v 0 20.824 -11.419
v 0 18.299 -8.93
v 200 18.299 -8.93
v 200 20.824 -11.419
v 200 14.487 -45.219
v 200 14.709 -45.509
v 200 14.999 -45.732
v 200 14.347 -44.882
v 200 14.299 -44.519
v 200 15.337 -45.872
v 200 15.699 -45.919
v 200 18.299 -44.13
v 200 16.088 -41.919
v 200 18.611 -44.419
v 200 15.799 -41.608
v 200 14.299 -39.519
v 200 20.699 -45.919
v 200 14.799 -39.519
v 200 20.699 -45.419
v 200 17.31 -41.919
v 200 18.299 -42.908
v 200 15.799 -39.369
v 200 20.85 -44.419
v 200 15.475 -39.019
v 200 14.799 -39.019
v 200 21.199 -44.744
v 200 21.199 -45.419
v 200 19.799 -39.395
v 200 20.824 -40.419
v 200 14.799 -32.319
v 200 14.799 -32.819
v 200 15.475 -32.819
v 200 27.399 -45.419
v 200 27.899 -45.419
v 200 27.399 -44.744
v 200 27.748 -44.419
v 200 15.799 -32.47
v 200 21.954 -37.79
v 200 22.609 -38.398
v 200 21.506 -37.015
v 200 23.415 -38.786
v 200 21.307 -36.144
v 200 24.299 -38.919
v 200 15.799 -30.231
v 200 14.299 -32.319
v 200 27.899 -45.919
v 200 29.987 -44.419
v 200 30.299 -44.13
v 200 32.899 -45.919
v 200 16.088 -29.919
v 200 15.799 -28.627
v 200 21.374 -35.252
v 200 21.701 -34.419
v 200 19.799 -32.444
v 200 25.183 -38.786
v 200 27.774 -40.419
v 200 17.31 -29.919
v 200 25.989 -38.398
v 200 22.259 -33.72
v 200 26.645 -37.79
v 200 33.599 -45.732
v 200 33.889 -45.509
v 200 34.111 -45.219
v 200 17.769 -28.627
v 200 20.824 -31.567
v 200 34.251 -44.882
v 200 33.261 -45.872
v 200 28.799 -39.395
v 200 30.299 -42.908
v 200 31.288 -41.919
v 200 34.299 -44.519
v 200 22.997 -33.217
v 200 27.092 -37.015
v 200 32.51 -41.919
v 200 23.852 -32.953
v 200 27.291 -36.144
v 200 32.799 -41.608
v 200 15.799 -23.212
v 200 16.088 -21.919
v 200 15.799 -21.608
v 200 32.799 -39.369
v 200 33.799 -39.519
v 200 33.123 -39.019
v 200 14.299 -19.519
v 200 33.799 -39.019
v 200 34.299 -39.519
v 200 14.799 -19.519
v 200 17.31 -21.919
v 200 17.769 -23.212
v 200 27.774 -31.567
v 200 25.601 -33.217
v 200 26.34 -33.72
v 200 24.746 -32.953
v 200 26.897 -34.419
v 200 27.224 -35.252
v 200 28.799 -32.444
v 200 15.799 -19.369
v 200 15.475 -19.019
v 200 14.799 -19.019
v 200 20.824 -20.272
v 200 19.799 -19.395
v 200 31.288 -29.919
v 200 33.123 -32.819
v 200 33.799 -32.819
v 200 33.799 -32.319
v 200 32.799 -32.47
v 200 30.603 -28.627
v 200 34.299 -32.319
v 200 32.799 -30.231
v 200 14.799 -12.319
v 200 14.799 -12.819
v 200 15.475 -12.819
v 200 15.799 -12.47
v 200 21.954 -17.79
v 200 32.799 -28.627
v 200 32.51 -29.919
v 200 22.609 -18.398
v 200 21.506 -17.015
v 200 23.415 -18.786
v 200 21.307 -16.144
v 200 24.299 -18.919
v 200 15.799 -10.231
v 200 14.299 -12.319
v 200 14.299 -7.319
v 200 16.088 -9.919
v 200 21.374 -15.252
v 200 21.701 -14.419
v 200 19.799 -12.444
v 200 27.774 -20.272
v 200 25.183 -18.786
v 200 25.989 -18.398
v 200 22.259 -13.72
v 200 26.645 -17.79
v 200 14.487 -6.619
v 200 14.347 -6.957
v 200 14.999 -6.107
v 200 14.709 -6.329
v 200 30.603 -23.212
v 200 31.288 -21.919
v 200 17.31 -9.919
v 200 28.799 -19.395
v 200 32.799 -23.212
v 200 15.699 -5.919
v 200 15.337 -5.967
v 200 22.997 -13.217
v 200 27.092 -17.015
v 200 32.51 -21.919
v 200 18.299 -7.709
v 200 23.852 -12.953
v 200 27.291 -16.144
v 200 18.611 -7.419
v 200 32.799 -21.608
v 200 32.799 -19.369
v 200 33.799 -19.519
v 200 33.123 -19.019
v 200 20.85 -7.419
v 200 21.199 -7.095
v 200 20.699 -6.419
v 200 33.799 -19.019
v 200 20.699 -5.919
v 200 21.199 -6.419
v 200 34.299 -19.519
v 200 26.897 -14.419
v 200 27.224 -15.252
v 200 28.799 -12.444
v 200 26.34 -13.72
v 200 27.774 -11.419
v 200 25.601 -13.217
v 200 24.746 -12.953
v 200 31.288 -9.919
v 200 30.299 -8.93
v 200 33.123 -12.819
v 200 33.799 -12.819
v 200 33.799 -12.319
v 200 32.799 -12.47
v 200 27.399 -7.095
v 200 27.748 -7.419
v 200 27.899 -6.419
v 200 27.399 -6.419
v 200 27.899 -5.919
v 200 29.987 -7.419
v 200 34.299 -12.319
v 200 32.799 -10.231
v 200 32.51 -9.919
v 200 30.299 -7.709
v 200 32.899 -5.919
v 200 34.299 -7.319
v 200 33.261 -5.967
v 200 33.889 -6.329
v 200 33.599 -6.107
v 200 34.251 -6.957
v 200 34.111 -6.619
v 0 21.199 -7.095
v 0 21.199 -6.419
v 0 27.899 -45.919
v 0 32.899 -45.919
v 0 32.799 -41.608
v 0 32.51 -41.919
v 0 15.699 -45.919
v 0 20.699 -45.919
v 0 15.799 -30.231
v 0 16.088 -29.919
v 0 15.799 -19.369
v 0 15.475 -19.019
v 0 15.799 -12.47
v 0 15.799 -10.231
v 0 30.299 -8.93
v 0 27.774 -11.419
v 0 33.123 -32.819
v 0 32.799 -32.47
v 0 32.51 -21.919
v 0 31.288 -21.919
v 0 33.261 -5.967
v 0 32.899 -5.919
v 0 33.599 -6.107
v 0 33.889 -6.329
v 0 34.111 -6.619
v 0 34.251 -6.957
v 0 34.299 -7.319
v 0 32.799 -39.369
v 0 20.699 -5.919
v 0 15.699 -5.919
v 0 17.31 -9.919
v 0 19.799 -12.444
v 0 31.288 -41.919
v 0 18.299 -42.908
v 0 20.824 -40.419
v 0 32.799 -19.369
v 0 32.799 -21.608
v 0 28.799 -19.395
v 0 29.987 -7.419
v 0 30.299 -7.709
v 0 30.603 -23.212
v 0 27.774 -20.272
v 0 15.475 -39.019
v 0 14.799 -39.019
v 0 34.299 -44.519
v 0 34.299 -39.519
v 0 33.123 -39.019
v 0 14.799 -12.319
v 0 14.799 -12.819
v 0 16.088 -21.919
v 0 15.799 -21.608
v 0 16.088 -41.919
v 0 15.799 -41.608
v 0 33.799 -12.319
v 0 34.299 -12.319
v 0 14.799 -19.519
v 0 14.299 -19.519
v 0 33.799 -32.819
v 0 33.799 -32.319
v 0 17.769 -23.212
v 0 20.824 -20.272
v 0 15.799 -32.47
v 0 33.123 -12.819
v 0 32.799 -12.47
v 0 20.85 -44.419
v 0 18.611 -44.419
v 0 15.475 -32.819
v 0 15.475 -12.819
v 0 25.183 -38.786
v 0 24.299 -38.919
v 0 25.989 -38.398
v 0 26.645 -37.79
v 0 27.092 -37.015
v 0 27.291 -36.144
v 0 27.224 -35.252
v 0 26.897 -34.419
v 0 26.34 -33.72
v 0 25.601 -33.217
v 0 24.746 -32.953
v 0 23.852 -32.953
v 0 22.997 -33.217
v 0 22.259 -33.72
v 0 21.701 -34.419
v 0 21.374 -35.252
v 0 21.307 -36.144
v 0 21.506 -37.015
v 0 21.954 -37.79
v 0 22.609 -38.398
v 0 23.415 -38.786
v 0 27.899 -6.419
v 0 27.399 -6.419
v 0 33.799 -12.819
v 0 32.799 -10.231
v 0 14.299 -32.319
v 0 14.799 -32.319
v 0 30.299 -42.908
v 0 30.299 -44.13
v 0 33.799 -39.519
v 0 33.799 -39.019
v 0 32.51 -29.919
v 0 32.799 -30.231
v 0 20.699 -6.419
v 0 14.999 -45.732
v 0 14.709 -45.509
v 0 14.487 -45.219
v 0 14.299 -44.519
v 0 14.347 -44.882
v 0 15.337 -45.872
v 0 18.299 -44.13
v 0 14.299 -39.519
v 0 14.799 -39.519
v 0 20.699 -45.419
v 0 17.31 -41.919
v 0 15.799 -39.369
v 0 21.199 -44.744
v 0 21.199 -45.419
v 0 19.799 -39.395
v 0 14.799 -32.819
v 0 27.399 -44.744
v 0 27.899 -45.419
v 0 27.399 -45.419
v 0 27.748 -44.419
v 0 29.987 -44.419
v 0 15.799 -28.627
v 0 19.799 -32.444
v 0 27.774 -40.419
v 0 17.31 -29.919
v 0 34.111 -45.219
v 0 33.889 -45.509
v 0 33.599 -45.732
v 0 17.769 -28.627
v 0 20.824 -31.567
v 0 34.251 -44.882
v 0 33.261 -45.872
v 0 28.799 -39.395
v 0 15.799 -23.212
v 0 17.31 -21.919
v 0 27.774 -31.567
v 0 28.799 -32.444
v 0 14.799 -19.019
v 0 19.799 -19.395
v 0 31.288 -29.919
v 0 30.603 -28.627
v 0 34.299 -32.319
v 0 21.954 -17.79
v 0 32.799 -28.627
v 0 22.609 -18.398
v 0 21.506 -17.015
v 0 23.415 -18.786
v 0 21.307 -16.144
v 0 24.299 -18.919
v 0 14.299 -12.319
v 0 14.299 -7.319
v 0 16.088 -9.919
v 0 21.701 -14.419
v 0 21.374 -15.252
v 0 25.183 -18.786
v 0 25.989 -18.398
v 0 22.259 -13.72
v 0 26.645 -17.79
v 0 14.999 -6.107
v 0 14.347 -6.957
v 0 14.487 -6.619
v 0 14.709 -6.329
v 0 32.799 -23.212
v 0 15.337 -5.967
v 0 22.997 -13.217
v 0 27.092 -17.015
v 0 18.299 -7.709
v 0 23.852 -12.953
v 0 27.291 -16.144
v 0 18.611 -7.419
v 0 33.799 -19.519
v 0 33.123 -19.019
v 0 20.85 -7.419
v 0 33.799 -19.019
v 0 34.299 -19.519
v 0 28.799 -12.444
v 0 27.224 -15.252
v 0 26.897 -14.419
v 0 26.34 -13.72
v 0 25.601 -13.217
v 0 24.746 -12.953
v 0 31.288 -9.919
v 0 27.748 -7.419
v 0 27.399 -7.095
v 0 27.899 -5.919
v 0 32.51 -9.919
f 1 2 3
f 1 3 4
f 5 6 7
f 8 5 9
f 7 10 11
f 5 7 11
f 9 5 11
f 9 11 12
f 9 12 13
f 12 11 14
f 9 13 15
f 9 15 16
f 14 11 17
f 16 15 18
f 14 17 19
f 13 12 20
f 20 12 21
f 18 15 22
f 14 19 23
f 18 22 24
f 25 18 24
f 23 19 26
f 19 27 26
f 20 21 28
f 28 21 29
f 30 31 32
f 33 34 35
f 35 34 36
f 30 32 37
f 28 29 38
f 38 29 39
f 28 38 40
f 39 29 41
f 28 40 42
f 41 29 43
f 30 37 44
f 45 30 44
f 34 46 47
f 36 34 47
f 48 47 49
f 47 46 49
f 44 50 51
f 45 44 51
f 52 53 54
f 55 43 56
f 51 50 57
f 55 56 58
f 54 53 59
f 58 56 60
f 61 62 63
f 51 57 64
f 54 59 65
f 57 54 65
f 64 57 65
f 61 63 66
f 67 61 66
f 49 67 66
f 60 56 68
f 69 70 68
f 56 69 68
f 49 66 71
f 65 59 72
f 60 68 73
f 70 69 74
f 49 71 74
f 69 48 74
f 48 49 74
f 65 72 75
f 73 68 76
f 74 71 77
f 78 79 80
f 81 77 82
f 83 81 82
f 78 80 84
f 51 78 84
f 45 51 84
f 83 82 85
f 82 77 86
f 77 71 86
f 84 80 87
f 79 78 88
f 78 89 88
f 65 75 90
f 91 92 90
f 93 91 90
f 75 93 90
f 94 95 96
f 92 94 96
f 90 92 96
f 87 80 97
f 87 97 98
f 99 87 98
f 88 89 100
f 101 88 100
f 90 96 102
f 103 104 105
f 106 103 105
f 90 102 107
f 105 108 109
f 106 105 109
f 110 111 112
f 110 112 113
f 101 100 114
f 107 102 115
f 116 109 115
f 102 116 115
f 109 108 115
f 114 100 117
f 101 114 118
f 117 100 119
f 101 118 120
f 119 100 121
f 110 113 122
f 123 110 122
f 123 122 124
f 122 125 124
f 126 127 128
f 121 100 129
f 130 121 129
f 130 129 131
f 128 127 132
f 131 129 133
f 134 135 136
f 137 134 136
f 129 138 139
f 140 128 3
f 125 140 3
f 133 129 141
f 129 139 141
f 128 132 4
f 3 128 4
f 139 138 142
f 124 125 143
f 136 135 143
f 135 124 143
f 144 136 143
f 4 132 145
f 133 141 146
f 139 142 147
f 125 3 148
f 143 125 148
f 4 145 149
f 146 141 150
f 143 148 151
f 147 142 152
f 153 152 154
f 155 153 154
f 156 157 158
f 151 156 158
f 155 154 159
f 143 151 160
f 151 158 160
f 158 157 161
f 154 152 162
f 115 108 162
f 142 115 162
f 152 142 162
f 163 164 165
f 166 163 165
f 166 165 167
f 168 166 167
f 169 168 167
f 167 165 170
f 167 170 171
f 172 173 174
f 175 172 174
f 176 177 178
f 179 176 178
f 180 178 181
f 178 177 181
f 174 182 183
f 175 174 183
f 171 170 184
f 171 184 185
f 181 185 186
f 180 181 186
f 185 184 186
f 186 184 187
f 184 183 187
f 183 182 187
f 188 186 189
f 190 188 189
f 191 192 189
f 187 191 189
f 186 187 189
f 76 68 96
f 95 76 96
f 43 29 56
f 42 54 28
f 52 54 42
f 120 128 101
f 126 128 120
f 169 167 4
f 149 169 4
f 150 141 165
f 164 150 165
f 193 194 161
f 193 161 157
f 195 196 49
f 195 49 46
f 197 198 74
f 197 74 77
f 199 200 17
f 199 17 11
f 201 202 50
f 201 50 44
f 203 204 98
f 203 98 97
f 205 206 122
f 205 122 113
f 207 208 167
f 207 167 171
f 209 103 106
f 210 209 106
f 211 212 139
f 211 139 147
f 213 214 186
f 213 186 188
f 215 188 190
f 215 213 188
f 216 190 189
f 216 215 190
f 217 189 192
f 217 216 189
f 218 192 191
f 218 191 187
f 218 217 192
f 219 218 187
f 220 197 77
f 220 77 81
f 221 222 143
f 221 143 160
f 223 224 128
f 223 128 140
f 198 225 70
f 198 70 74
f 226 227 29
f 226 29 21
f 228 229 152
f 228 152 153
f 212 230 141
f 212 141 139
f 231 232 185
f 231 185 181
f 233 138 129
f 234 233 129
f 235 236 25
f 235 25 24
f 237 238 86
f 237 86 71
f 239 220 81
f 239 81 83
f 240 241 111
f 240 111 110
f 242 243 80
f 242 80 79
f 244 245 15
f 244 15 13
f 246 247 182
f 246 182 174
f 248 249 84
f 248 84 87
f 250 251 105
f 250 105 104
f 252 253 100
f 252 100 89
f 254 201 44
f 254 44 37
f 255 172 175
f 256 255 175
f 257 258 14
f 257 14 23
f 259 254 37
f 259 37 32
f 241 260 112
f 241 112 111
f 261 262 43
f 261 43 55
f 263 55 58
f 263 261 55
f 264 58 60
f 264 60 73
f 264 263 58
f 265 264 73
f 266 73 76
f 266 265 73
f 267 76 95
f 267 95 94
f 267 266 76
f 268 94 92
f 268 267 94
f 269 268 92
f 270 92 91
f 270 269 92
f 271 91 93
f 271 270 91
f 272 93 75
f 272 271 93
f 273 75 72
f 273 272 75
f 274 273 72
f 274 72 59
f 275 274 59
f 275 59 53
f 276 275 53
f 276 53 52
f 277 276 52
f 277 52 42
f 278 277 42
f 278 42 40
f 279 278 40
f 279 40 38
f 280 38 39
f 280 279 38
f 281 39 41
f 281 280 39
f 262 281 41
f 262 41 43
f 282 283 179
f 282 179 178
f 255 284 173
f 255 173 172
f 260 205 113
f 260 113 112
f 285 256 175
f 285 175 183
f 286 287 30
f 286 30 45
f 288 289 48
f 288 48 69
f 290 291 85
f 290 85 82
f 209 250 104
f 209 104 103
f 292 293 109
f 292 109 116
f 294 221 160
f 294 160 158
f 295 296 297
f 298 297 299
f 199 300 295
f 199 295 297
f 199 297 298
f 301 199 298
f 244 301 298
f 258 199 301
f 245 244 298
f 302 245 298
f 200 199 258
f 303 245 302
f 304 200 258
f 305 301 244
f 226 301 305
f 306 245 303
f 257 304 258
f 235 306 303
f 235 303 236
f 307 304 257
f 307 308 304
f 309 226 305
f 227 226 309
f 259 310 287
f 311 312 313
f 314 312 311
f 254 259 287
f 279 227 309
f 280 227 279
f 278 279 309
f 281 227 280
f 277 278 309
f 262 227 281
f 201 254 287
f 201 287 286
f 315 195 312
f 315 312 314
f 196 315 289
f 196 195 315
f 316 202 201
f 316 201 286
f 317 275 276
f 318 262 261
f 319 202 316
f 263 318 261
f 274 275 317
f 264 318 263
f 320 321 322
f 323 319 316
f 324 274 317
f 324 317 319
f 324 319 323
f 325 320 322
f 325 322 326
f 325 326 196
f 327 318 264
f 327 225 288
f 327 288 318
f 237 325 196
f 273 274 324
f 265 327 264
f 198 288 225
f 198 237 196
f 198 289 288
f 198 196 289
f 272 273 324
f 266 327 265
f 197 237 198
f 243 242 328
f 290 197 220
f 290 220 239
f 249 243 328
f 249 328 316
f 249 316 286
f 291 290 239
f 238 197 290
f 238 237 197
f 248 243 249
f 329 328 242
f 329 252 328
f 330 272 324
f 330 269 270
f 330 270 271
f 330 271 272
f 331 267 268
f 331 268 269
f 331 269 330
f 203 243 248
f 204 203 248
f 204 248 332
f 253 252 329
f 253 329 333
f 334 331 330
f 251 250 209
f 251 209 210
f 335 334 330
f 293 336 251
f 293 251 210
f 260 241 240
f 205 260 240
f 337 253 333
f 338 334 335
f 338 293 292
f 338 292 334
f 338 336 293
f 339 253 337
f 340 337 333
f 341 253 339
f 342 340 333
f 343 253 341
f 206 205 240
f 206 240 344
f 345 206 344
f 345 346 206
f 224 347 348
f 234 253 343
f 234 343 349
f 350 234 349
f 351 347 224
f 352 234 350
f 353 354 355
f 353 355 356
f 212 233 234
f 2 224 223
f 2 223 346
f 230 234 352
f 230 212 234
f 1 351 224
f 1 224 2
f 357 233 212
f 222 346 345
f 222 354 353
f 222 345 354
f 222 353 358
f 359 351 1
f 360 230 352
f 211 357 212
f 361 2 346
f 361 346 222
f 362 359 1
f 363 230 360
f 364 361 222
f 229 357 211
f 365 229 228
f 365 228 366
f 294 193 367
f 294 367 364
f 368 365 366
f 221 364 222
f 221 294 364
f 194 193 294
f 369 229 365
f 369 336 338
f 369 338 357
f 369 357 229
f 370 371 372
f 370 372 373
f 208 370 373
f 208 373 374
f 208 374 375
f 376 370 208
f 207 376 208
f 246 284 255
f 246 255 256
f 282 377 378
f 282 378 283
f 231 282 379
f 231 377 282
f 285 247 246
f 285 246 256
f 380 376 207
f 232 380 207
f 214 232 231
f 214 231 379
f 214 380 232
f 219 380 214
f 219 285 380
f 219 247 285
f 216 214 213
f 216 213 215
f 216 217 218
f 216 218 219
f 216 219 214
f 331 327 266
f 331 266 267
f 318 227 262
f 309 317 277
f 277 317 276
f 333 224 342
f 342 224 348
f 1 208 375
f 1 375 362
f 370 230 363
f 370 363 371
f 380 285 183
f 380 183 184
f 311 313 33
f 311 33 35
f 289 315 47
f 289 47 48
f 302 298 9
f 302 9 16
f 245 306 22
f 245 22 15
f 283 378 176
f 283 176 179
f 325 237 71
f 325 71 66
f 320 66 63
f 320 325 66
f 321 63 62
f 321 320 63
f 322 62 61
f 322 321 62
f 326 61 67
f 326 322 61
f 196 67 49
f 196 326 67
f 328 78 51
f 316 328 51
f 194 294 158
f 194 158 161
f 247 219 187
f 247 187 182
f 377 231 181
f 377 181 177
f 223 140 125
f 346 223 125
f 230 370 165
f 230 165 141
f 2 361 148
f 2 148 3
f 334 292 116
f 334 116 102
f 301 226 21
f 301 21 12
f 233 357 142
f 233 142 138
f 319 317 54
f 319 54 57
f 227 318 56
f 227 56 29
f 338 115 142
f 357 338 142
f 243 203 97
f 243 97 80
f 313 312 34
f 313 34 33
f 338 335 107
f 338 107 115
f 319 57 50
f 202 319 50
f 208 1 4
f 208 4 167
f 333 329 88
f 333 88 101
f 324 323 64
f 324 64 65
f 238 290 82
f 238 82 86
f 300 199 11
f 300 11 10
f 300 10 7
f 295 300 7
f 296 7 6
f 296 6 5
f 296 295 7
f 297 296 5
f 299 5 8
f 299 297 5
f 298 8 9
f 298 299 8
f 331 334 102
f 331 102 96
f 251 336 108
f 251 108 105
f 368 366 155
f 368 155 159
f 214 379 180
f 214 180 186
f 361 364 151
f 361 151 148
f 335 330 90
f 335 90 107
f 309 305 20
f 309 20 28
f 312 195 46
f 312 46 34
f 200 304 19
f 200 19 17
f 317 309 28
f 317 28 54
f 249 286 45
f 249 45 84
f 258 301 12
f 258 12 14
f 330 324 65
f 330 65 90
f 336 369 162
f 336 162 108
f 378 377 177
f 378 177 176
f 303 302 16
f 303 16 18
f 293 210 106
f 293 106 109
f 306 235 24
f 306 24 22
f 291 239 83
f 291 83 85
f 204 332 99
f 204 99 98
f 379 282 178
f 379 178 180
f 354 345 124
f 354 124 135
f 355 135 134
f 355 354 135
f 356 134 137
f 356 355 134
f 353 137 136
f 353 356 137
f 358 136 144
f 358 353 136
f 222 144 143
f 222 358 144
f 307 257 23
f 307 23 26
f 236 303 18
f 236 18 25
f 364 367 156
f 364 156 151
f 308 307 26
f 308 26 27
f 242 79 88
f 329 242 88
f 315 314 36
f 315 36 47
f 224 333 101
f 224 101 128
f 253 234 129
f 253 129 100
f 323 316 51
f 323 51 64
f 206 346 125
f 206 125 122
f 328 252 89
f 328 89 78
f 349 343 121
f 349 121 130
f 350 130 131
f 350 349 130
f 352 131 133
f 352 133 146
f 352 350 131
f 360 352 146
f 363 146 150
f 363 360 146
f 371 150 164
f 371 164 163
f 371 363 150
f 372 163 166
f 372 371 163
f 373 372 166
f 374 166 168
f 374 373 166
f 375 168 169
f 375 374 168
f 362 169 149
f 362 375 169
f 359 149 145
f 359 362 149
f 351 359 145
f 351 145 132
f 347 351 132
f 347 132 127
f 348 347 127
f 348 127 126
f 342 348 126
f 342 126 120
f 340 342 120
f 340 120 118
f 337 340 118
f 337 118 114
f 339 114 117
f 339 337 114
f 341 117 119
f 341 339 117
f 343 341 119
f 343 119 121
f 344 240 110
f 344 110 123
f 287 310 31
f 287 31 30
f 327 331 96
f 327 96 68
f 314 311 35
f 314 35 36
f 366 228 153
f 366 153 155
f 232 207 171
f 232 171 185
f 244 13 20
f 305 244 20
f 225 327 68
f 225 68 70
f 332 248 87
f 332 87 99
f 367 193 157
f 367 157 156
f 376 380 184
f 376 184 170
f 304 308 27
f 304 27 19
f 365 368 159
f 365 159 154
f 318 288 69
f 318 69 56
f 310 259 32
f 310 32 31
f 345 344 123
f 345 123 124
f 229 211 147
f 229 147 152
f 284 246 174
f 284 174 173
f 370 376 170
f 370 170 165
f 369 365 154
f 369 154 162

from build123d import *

# Parameters (mm, degrees)
SKETCH_1_R      = 3
EXTRUDE_1_DEPTH = 200


with BuildPart() as part:
    # Эскиз1 → Бобышка-Вытянуть1 (new body)
    with BuildSketch(Plane(origin=(0, 0, 0), x_dir=(0, 0, -1), z_dir=(1, 0, 0))):
        with BuildLine():
            Line((19.519439061, 34.299030696), (24.519439061, 34.299030696))
            Line((24.519439061, 34.299030696), (27.319439061, 34.299030696))
            Line((27.319439061, 34.299030696), (32.319439061, 34.299030696))
            Line((32.319439061, 34.299030696), (32.319439061, 33.799030696))
            Line((32.319439061, 33.799030696), (32.819439061, 33.799030696))
            Line((32.819439061, 33.799030696), (32.819439061, 33.123453071))
            Line((32.819439061, 33.123453071), (32.470086687, 32.799030696))
            Line((32.470086687, 32.799030696), (30.231003523, 32.799030696))
            Line((30.231003523, 32.799030696), (29.919439061, 32.509699663))
            Line((29.919439061, 32.509699663), (29.919439061, 31.288014106))
            Line((29.919439061, 31.288014106), (32.444289636, 28.799030696))
            Line((32.444289636, 28.799030696), (39.394588486, 28.799030696))
            Line((39.394588486, 28.799030696), (41.919439061, 31.288014106))
            Line((41.919439061, 31.288014106), (41.919439061, 32.509699663))
            Line((41.919439061, 32.509699663), (41.607874598, 32.799030696))
            Line((41.607874598, 32.799030696), (39.368791434, 32.799030696))
            Line((39.368791434, 32.799030696), (39.019439061, 33.123453071))
            Line((39.019439061, 33.123453071), (39.019439061, 33.799030696))
            Line((39.019439061, 33.799030696), (39.519439061, 33.799030696))
            Line((39.519439061, 33.799030696), (39.519439061, 34.299030696))
            Line((39.519439061, 34.299030696), (44.519439061, 34.299030696))
            ThreePointArc((44.519439061, 34.299030696), (45.509388554, 33.88898019), (45.919439061, 32.899030696))
            Line((45.919439061, 32.899030696), (45.919439061, 27.899030696))
            Line((45.919439061, 27.899030696), (45.419439061, 27.899030696))
            Line((45.419439061, 27.899030696), (45.419439061, 27.399030696))
            Line((45.419439061, 27.399030696), (44.743861436, 27.399030696))
            Line((44.743861436, 27.399030696), (44.419439061, 27.748383069))
            Line((44.419439061, 27.748383069), (44.419439061, 29.987466234))
            Line((44.419439061, 29.987466234), (44.130108028, 30.299030696))
            Line((44.130108028, 30.299030696), (42.908422471, 30.299030696))
            Line((42.908422471, 30.299030696), (40.419439061, 27.774180121))
            Line((40.419439061, 27.774180121), (40.419439061, 20.823881271))
            Line((40.419439061, 20.823881271), (42.908422471, 18.299030696))
            Line((42.908422471, 18.299030696), (44.130108028, 18.299030696))
            Line((44.130108028, 18.299030696), (44.419439061, 18.610595158))
            Line((44.419439061, 18.610595158), (44.419439061, 20.849678323))
            Line((44.419439061, 20.849678323), (44.743861436, 21.199030696))
            Line((44.743861436, 21.199030696), (45.419439061, 21.199030696))
            Line((45.419439061, 21.199030696), (45.419439061, 20.699030696))
            Line((45.419439061, 20.699030696), (45.919439061, 20.699030696))
            Line((45.919439061, 20.699030696), (45.919439061, 15.699030696))
            ThreePointArc((45.919439061, 15.699030696), (45.509388554, 14.709081202), (44.519439061, 14.299030696))
            Line((44.519439061, 14.299030696), (39.519439061, 14.299030696))
            Line((39.519439061, 14.299030696), (39.519439061, 14.799030696))
            Line((39.519439061, 14.799030696), (39.019439061, 14.799030696))
            Line((39.019439061, 14.799030696), (39.019439061, 15.47460832))
            Line((39.019439061, 15.47460832), (39.368791434, 15.799030696))
            Line((39.368791434, 15.799030696), (41.607874598, 15.799030696))
            Line((41.607874598, 15.799030696), (41.919439061, 16.088361729))
            Line((41.919439061, 16.088361729), (41.919439061, 17.310047285))
            Line((41.919439061, 17.310047285), (39.394588486, 19.799030696))
            Line((39.394588486, 19.799030696), (32.444289636, 19.799030696))
            Line((32.444289636, 19.799030696), (29.919439061, 17.310047285))
            Line((29.919439061, 17.310047285), (29.919439061, 16.088361729))
            Line((29.919439061, 16.088361729), (30.231003523, 15.799030696))
            Line((30.231003523, 15.799030696), (32.470086687, 15.799030696))
            Line((32.470086687, 15.799030696), (32.819439061, 15.47460832))
            Line((32.819439061, 15.47460832), (32.819439061, 14.799030696))
            Line((32.819439061, 14.799030696), (32.319439061, 14.799030696))
            Line((32.319439061, 14.799030696), (32.319439061, 14.299030696))
            Line((32.319439061, 14.299030696), (27.319439061, 14.299030696))
            Line((27.319439061, 14.299030696), (24.519439061, 14.299030696))
            Line((24.519439061, 14.299030696), (19.519439061, 14.299030696))
            Line((19.519439061, 14.299030696), (19.519439061, 14.799030696))
            Line((19.519439061, 14.799030696), (19.019439061, 14.799030696))
            Line((19.019439061, 14.799030696), (19.019439061, 15.47460832))
            Line((19.019439061, 15.47460832), (19.368791434, 15.799030696))
            Line((19.368791434, 15.799030696), (21.607874598, 15.799030696))
            Line((21.607874598, 15.799030696), (21.919439061, 16.088361729))
            Line((21.919439061, 16.088361729), (21.919439061, 17.310047285))
            Line((21.919439061, 17.310047285), (19.394588486, 19.799030696))
            Line((19.394588486, 19.799030696), (12.444289636, 19.799030696))
            Line((12.444289636, 19.799030696), (9.919439061, 17.310047285))
            Line((9.919439061, 17.310047285), (9.919439061, 16.088361729))
            Line((9.919439061, 16.088361729), (10.231003523, 15.799030696))
            Line((10.231003523, 15.799030696), (12.470086687, 15.799030696))
            Line((12.470086687, 15.799030696), (12.819439061, 15.47460832))
            Line((12.819439061, 15.47460832), (12.819439061, 14.799030696))
            Line((12.819439061, 14.799030696), (12.319439061, 14.799030696))
            Line((12.319439061, 14.799030696), (12.319439061, 14.299030696))
            Line((12.319439061, 14.299030696), (7.319439061, 14.299030696))
            ThreePointArc((7.319439061, 14.299030696), (6.329489567, 14.709081202), (5.919439061, 15.699030696))
            Line((5.919439061, 15.699030696), (5.919439061, 20.699030696))
            Line((5.919439061, 20.699030696), (6.419439061, 20.699030696))
            Line((6.419439061, 20.699030696), (6.419439061, 21.199030696))
            Line((6.419439061, 21.199030696), (7.095016685, 21.199030696))
            Line((7.095016685, 21.199030696), (7.419439061, 20.849678323))
            Line((7.419439061, 20.849678323), (7.419439061, 18.610595158))
            Line((7.419439061, 18.610595158), (7.708770093, 18.299030696))
            Line((7.708770093, 18.299030696), (8.93045565, 18.299030696))
            Line((8.93045565, 18.299030696), (11.419439061, 20.823881271))
            Line((11.419439061, 20.823881271), (11.419439061, 27.774180121))
            Line((11.419439061, 27.774180121), (8.93045565, 30.299030696))
            Line((8.93045565, 30.299030696), (7.708770093, 30.299030696))
            Line((7.708770093, 30.299030696), (7.419439061, 29.987466234))
            Line((7.419439061, 29.987466234), (7.419439061, 27.748383069))
            Line((7.419439061, 27.748383069), (7.095016685, 27.399030696))
            Line((7.095016685, 27.399030696), (6.419439061, 27.399030696))
            Line((6.419439061, 27.399030696), (6.419439061, 27.899030696))
            Line((6.419439061, 27.899030696), (5.919439061, 27.899030696))
            Line((5.919439061, 27.899030696), (5.919439061, 32.899030696))
            ThreePointArc((5.919439061, 32.899030696), (6.329489567, 33.88898019), (7.319439061, 34.299030696))
            Line((7.319439061, 34.299030696), (12.319439061, 34.299030696))
            Line((12.319439061, 34.299030696), (12.319439061, 33.799030696))
            Line((12.319439061, 33.799030696), (12.819439061, 33.799030696))
            Line((12.819439061, 33.799030696), (12.819439061, 33.123453071))
            Line((12.819439061, 33.123453071), (12.470086687, 32.799030696))
            Line((12.470086687, 32.799030696), (10.231003523, 32.799030696))
            Line((10.231003523, 32.799030696), (9.919439061, 32.509699663))
            Line((9.919439061, 32.509699663), (9.919439061, 31.288014106))
            Line((9.919439061, 31.288014106), (12.444289636, 28.799030696))
            Line((12.444289636, 28.799030696), (19.394588486, 28.799030696))
            Line((19.394588486, 28.799030696), (21.919439061, 31.288014106))
            Line((21.919439061, 31.288014106), (21.919439061, 32.509699663))
            Line((21.919439061, 32.509699663), (21.607874598, 32.799030696))
            Line((21.607874598, 32.799030696), (19.368791434, 32.799030696))
            Line((19.368791434, 32.799030696), (19.019439061, 33.123453071))
            Line((19.019439061, 33.123453071), (19.019439061, 33.799030696))
            Line((19.019439061, 33.799030696), (19.519439061, 33.799030696))
            Line((19.519439061, 33.799030696), (19.519439061, 34.299030696))
        make_face()
        with Locations((15.919439061, 24.299030696)):
            Circle(SKETCH_1_R, mode=Mode.SUBTRACT)
        with Locations((35.919439061, 24.299030696)):
            Circle(SKETCH_1_R, mode=Mode.SUBTRACT)
        Polygon((28.627102151, 32.799030696), (23.21177597, 32.799030696), (23.21177597, 30.602545824), (20.272319384, 27.774180121), (20.272319384, 20.823881271), (23.21177597, 17.768970439), (23.21177597, 15.799030696), (28.627102151, 15.799030696), (28.627102151, 17.768970439), (31.566558738, 20.823881271), (31.566558738, 27.774180121), (28.627102151, 30.602545824), align=None, mode=Mode.SUBTRACT)
    extrude(amount=EXTRUDE_1_DEPTH)


solid = part.part
